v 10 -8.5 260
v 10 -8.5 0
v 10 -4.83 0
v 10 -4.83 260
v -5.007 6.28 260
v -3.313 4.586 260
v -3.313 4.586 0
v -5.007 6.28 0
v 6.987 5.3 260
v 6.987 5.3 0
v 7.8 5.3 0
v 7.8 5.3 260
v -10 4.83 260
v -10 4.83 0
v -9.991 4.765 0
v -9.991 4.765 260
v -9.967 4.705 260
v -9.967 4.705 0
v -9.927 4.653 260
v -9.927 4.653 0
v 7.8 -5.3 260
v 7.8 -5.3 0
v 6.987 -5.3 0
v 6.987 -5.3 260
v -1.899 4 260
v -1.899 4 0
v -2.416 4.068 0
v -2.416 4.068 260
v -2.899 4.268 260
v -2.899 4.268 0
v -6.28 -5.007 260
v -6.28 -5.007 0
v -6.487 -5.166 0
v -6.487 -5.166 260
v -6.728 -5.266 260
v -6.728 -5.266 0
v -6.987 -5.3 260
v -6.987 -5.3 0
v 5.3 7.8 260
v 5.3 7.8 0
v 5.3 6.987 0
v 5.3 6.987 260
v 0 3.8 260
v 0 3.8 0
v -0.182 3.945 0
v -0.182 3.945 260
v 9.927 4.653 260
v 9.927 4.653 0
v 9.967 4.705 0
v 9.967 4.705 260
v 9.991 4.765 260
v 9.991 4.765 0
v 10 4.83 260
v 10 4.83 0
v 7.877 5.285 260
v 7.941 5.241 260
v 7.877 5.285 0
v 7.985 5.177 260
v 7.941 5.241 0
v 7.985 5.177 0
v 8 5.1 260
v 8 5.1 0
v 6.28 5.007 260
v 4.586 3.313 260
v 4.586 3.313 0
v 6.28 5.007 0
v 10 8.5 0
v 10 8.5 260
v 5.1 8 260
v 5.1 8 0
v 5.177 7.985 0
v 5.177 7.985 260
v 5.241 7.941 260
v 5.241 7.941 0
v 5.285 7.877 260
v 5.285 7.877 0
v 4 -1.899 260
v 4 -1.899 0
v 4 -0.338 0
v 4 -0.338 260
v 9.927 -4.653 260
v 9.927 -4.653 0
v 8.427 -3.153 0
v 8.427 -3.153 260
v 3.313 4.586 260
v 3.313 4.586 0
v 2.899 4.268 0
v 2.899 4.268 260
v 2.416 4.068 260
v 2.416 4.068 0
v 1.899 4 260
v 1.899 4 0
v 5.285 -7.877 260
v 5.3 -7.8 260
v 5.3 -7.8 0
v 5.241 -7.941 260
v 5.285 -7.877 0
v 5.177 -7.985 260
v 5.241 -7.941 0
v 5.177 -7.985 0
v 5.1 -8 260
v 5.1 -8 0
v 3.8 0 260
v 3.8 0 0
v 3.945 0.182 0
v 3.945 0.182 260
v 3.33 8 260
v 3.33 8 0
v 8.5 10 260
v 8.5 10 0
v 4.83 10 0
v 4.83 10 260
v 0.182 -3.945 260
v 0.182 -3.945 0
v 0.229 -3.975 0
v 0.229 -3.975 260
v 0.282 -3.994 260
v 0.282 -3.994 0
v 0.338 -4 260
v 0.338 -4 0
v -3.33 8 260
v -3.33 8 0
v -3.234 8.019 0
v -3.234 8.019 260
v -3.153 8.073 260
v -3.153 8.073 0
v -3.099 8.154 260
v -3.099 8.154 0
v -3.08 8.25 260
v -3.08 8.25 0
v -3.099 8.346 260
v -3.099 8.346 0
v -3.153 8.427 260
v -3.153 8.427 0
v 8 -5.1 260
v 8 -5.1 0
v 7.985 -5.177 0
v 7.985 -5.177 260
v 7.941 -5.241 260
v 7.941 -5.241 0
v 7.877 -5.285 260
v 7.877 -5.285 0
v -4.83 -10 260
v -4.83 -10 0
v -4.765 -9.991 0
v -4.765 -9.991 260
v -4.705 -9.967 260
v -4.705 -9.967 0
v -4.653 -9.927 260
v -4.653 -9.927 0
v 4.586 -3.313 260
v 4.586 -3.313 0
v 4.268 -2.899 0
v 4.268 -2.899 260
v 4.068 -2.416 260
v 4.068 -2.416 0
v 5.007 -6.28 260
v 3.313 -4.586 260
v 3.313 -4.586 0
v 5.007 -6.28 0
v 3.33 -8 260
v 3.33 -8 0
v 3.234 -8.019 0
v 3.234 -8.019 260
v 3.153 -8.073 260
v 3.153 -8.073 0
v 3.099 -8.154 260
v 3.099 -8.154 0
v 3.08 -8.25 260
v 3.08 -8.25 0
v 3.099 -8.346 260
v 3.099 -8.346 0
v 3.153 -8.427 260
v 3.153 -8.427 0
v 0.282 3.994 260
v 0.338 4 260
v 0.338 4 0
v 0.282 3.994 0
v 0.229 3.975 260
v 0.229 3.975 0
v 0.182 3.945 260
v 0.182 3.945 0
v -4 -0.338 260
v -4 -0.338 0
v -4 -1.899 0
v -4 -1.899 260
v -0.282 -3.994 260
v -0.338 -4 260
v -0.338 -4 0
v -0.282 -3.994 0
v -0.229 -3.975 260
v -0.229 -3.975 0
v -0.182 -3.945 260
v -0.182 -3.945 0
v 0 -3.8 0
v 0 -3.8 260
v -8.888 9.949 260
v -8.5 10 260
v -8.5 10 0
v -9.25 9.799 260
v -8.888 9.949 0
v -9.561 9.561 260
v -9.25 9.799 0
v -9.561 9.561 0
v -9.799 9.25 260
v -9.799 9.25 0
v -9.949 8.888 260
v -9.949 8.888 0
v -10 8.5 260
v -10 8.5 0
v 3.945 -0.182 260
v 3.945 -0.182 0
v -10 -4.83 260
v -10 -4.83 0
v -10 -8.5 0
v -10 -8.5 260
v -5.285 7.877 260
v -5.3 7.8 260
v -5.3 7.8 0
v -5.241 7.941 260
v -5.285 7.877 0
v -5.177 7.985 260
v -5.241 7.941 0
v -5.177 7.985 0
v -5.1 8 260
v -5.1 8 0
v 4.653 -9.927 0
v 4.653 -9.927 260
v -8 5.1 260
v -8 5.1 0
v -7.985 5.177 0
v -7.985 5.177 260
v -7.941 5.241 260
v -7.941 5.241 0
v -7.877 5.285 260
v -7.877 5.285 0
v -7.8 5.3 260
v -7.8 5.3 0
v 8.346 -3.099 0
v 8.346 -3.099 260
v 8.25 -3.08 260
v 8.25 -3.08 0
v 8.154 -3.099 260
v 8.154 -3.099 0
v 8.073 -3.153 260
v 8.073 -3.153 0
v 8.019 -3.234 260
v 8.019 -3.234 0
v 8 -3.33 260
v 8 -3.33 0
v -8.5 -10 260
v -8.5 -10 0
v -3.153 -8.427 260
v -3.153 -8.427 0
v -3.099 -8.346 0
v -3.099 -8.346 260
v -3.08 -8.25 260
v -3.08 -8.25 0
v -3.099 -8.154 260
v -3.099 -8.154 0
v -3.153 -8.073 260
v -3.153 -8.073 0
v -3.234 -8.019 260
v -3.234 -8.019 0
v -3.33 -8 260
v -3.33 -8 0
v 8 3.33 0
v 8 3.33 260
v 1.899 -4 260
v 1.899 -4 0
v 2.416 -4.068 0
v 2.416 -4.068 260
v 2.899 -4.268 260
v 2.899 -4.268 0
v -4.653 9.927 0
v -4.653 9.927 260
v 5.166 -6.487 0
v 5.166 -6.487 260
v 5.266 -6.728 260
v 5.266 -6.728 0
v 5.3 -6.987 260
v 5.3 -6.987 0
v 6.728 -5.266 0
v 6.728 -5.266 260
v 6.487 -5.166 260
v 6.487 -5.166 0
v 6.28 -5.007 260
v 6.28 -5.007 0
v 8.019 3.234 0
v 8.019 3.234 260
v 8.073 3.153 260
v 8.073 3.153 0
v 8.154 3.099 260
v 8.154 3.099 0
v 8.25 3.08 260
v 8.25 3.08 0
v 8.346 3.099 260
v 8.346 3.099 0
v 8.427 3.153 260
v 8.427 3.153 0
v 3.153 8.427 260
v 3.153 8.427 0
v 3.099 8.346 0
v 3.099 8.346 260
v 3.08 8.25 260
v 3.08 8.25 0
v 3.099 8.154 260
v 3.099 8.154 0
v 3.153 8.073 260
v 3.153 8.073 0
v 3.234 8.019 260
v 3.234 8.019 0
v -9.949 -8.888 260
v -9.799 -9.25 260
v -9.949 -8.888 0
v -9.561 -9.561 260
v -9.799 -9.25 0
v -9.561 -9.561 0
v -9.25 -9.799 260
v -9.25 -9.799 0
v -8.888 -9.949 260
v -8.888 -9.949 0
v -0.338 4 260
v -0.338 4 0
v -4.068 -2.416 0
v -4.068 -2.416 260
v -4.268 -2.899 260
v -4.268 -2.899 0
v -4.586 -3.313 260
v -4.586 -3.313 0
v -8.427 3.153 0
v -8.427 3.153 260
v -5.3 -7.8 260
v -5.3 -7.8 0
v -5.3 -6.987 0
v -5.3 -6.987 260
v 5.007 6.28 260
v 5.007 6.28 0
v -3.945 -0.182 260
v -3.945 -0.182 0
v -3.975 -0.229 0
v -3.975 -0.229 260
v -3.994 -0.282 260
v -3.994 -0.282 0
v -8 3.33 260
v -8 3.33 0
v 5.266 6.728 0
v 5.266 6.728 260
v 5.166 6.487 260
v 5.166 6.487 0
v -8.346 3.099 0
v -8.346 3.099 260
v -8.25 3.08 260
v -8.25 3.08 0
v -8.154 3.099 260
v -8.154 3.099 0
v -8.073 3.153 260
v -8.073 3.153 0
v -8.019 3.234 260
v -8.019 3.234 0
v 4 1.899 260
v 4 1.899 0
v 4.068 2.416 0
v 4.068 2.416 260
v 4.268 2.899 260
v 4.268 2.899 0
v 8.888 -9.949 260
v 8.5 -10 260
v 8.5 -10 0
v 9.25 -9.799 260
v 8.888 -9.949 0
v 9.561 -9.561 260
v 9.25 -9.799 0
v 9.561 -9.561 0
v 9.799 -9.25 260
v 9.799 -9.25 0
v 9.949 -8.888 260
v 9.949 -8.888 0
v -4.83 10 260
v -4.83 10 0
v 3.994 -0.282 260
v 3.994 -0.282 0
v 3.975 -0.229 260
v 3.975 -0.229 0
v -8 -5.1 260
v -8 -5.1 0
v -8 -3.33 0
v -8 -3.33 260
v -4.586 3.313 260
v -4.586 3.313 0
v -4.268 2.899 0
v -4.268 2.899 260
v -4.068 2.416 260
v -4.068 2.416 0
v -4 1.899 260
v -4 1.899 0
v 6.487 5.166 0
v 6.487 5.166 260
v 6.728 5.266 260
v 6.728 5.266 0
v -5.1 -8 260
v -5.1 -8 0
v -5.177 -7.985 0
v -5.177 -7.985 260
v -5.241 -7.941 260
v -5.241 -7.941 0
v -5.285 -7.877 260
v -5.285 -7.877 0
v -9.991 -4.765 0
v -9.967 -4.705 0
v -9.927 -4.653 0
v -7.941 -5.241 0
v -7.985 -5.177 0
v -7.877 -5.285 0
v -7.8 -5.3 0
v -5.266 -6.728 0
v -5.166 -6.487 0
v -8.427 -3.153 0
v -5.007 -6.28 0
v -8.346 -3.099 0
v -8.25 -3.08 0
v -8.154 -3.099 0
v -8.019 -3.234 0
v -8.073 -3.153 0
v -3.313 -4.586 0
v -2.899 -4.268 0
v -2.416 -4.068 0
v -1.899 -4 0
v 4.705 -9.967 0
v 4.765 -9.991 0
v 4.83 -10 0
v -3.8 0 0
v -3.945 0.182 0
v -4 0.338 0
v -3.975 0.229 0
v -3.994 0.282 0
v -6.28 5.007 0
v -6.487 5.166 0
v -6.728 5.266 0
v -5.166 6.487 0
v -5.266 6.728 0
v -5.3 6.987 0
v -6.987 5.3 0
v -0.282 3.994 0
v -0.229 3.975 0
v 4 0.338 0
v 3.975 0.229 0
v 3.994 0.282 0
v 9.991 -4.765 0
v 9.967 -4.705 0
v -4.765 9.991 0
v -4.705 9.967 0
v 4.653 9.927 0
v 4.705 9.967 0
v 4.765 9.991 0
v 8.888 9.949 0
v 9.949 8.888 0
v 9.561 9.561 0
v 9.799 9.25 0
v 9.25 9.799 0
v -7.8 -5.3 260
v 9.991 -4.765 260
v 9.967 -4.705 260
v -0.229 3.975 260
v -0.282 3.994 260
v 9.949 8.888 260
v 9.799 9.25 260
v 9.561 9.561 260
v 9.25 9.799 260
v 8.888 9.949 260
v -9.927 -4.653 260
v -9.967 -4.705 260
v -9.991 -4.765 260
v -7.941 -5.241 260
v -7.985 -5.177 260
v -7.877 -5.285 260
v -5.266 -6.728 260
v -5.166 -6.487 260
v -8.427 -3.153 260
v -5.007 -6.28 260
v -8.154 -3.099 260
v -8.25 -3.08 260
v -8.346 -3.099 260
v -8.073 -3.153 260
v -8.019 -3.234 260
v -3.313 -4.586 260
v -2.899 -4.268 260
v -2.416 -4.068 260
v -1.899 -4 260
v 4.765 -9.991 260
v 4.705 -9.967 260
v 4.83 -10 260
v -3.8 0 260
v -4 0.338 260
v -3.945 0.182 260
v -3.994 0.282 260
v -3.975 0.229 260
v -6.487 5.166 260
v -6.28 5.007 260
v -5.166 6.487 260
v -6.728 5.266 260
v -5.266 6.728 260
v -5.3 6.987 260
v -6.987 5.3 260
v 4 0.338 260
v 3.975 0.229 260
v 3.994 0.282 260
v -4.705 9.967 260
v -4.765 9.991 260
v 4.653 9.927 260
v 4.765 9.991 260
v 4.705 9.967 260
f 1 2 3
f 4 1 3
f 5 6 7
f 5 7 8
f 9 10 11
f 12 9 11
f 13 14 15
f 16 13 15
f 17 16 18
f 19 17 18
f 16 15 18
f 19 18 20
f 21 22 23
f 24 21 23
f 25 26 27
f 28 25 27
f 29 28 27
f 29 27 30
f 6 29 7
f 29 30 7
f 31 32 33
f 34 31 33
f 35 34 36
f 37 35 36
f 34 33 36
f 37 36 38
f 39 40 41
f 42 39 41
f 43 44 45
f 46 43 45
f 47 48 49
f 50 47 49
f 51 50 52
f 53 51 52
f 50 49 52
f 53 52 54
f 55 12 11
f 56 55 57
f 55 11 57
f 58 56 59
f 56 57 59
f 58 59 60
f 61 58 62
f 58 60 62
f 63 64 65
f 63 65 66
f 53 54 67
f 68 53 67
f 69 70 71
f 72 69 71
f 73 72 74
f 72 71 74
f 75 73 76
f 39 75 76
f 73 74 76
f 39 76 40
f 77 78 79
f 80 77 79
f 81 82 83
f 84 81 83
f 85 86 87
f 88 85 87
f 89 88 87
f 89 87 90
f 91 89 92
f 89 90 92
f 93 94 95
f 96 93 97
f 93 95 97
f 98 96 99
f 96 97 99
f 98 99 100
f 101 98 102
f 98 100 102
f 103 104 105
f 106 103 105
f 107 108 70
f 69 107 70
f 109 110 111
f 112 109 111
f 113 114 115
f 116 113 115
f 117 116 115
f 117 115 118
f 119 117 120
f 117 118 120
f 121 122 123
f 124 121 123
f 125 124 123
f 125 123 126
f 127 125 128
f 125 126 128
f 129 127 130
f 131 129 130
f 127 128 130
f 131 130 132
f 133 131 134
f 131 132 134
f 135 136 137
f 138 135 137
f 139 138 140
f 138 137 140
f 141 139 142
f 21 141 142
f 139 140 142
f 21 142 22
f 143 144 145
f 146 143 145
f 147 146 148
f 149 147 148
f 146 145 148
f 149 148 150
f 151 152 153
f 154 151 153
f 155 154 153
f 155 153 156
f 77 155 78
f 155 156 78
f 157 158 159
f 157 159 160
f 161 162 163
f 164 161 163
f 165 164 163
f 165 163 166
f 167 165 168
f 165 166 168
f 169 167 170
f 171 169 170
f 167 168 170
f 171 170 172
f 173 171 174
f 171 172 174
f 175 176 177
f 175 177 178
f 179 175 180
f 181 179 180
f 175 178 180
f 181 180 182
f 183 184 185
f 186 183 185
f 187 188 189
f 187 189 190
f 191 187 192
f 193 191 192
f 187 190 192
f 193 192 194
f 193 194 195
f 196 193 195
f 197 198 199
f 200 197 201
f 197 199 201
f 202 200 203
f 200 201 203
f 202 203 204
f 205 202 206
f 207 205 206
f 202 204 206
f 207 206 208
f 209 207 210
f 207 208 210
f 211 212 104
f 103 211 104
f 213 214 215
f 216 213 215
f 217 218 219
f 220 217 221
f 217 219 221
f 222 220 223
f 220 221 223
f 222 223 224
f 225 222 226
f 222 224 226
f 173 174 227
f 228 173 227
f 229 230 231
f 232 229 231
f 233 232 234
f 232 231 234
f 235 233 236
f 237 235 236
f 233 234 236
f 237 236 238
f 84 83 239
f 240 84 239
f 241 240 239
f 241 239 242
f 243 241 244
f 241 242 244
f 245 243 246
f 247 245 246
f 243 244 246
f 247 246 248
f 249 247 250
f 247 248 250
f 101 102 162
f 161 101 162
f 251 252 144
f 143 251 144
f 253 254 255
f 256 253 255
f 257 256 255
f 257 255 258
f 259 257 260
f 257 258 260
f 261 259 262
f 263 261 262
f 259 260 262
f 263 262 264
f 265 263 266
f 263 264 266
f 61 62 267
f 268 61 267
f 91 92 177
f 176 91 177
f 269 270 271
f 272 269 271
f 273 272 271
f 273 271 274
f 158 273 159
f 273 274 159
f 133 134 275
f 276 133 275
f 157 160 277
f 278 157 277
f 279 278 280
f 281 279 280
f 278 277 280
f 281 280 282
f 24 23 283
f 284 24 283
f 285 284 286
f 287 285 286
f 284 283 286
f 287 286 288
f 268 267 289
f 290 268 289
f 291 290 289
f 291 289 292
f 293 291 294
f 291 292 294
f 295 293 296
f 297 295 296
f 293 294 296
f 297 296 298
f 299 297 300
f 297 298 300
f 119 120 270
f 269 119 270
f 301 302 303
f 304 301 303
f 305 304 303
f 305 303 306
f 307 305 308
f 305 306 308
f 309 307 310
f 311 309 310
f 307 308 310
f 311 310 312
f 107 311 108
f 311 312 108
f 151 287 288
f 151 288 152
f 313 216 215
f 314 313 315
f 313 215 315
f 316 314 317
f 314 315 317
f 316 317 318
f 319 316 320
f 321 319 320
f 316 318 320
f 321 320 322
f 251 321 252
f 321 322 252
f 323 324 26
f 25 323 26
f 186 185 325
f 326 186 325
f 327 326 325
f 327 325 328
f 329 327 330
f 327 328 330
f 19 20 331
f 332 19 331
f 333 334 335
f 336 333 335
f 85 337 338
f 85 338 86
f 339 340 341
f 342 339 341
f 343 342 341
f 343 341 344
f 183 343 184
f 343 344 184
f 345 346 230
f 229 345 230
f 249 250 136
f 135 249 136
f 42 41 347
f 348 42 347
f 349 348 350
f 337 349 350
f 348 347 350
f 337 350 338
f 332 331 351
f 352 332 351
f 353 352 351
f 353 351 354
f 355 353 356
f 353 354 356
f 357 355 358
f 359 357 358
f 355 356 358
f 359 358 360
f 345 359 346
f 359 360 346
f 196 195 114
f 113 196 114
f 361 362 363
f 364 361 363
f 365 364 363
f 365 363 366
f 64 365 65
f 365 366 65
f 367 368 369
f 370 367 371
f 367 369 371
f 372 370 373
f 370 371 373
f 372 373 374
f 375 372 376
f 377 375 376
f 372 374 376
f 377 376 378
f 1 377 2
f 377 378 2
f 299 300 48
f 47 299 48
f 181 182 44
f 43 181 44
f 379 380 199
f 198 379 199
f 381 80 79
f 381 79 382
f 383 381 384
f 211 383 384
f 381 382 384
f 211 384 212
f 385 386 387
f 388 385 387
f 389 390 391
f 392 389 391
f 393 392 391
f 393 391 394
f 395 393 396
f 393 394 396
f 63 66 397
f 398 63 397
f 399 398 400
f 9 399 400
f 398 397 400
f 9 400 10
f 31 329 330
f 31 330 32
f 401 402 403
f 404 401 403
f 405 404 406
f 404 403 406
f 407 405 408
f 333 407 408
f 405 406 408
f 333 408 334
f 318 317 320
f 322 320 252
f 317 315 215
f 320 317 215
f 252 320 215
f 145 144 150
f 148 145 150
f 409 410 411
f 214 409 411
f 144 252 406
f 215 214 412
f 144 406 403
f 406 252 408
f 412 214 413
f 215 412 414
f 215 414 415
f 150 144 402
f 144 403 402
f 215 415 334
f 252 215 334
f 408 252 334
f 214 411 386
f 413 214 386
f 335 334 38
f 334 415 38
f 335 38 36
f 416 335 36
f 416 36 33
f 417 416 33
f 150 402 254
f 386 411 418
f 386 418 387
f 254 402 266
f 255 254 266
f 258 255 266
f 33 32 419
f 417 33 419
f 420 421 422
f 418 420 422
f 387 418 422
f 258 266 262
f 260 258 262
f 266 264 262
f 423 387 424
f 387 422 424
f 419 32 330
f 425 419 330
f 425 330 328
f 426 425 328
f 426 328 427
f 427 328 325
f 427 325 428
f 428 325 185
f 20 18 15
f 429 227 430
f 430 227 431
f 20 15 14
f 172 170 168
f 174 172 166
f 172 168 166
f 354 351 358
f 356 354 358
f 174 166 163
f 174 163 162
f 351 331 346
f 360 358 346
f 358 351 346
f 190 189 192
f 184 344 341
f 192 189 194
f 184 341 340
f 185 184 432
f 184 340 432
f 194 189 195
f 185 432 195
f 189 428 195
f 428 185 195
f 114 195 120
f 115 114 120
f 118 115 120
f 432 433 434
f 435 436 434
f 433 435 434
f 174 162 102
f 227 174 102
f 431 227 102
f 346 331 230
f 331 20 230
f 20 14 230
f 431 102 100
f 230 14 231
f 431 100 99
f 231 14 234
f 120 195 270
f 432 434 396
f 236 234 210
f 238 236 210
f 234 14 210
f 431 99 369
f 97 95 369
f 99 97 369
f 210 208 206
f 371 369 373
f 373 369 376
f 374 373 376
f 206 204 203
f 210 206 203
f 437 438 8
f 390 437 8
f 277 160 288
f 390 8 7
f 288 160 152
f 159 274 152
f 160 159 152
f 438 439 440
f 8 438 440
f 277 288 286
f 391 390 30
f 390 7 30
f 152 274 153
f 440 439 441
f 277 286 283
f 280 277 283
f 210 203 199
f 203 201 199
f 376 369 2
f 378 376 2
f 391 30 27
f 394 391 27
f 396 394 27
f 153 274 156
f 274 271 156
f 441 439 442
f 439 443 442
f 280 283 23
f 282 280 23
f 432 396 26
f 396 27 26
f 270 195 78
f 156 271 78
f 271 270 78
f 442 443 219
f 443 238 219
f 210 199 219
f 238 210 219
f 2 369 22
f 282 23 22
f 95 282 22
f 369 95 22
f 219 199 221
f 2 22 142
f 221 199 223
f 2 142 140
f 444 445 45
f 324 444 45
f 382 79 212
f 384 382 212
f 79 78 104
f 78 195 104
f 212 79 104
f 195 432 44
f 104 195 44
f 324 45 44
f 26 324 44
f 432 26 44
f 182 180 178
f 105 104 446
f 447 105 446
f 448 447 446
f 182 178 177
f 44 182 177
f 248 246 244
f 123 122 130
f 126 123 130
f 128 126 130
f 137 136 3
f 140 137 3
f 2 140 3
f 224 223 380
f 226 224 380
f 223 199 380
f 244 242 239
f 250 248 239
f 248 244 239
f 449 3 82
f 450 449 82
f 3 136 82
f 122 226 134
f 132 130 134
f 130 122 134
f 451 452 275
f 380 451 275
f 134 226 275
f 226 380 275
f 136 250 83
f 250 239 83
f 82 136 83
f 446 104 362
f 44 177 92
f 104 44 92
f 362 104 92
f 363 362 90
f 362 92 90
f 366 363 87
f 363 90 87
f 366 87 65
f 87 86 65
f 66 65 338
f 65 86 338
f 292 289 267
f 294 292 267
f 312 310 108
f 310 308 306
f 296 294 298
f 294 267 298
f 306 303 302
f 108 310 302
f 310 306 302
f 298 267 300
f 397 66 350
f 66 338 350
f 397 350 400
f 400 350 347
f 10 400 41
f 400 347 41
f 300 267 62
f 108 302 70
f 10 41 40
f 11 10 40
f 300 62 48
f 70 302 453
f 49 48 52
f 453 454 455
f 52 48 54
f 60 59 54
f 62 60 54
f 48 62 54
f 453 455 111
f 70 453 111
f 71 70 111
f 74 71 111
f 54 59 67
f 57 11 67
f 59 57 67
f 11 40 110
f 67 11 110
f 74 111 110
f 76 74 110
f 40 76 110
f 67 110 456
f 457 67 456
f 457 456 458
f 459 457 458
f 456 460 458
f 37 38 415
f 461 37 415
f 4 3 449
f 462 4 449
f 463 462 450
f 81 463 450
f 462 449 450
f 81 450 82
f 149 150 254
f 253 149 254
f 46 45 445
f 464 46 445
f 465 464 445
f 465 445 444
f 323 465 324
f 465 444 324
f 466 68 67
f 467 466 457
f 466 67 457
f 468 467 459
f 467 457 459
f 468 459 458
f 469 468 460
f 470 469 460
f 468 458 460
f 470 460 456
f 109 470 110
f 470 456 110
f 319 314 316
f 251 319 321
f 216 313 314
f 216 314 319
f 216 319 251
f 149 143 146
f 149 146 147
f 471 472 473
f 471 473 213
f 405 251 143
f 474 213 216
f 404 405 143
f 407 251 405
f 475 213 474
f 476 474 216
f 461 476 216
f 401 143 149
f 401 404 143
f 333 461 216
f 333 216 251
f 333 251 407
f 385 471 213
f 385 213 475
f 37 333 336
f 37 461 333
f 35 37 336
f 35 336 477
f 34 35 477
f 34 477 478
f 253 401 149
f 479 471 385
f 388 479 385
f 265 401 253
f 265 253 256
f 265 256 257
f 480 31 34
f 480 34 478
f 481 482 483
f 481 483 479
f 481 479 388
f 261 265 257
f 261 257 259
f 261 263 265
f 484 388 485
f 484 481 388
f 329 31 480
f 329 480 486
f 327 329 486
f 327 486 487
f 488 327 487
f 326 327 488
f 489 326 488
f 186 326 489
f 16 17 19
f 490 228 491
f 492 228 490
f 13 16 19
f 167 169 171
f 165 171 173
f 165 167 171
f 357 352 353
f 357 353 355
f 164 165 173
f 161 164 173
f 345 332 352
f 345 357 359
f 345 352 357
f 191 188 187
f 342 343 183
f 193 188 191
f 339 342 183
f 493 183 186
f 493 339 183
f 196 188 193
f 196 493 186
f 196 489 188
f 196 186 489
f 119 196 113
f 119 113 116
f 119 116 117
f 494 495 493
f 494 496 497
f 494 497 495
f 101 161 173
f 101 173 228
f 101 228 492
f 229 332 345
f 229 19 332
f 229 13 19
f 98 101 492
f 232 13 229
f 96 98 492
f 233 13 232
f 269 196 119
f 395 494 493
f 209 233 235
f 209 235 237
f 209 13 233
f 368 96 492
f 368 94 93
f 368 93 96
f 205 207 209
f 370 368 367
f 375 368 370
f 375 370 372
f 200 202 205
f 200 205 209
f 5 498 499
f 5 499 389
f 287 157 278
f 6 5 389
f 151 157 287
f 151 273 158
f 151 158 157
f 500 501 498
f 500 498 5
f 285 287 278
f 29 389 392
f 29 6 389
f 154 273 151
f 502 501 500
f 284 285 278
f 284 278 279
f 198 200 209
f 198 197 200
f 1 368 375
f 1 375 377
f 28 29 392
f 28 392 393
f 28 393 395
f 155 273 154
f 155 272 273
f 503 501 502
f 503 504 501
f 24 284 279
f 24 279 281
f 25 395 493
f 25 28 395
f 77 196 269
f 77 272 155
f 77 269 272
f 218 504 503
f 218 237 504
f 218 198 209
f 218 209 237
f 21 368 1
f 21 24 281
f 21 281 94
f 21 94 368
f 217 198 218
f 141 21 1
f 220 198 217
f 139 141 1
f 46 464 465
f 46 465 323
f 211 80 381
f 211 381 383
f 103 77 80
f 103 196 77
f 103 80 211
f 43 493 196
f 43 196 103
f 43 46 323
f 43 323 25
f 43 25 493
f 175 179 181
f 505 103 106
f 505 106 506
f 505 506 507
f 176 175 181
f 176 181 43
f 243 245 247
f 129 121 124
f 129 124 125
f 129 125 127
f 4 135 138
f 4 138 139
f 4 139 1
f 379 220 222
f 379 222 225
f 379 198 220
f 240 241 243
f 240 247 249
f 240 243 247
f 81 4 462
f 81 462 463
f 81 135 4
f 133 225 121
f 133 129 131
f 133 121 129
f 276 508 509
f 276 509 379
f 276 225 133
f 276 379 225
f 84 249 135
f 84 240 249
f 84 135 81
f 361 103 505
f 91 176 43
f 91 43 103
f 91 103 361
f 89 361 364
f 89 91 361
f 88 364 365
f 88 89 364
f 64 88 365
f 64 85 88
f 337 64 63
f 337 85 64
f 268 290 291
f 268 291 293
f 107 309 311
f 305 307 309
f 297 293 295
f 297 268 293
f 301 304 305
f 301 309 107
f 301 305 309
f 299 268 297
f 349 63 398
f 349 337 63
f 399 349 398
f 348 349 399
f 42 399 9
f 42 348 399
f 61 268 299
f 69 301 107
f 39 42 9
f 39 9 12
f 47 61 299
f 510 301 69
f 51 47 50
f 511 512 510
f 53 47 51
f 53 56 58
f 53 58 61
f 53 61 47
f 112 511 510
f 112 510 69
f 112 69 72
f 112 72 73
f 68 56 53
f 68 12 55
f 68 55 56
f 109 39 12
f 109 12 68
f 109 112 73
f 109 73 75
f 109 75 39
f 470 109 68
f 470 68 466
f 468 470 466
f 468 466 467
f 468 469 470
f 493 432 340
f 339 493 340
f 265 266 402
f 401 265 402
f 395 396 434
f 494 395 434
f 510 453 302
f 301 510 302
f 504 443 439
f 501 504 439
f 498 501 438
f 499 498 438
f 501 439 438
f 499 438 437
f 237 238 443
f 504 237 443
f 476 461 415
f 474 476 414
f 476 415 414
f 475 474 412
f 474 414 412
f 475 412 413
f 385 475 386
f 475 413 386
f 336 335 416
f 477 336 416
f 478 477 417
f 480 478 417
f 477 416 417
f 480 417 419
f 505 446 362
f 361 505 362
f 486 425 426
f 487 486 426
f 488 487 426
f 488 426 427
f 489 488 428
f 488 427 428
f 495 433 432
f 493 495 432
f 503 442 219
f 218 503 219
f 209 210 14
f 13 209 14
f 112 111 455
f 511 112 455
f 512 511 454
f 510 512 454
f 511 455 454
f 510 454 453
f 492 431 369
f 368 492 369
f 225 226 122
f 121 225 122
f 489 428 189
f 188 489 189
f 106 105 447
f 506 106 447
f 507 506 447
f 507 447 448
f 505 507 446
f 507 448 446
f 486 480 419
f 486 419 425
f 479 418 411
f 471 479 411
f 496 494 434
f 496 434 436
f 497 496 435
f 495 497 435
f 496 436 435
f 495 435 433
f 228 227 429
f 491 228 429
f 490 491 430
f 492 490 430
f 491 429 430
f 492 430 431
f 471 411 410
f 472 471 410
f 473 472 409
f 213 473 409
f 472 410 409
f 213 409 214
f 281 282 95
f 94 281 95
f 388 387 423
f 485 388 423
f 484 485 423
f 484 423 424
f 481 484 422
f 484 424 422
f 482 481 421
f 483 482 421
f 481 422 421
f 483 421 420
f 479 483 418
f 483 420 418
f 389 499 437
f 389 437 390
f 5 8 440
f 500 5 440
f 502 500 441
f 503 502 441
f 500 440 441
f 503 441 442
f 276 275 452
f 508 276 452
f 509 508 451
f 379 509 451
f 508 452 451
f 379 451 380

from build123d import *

# Parameters (mm, degrees)
EXTRUDE_1_DEPTH = 260


# Read off the part's stored shape, not the designer's step: 222 Конструкционный профиль 20х20-1-surface1
with BuildPart() as part:
    # Эскиз1 → Бобышка-Вытянуть1 (new body)
    with BuildSketch(Plane.XY):
        with BuildLine():
            Line((-3.945217202, 0.181521503), (-3.8, 0))
            Line((-3.8, 0), (-3.945217202, -0.181521503))
            ThreePointArc((-3.945217202, -0.181521503), (-3.98590708, -0.254943529), (-4, -0.337695265))
            Line((-4, -0.337695265), (-4, -1.898780669))
            ThreePointArc((-4, -1.898780669), (-4.152240935, -2.664147534), (-4.585786438, -3.312994231))
            Line((-4.585786438, -3.312994231), (-6.279898987, -5.007106781))
            ThreePointArc((-6.279898987, -5.007106781), (-6.604322336, -5.223879533), (-6.987005769, -5.3))
            Line((-6.987005769, -5.3), (-7.8, -5.3))
            ThreePointArc((-7.8, -5.3), (-7.941421356, -5.241421356), (-8, -5.1))
            Line((-8, -5.1), (-8, -3.33))
            ThreePointArc((-8, -3.33), (-8.154329142, -3.099030117), (-8.426776695, -3.153223305))
            Line((-8.426776695, -3.153223305), (-9.926776695, -4.653223305))
            ThreePointArc((-9.926776695, -4.653223305), (-9.980969883, -4.734329142), (-10, -4.83))
            Line((-10, -4.83), (-10, -8.5))
            ThreePointArc((-10, -8.5), (-9.560660172, -9.560660172), (-8.5, -10))
            Line((-8.5, -10), (-4.83, -10))
            ThreePointArc((-4.83, -10), (-4.734329142, -9.980969883), (-4.653223305, -9.926776695))
            Line((-4.653223305, -9.926776695), (-3.153223305, -8.426776695))
            ThreePointArc((-3.153223305, -8.426776695), (-3.099030117, -8.154329142), (-3.33, -8))
            Line((-3.33, -8), (-5.1, -8))
            ThreePointArc((-5.1, -8), (-5.241421356, -7.941421356), (-5.3, -7.8))
            Line((-5.3, -7.8), (-5.3, -6.987005769))
            ThreePointArc((-5.3, -6.987005769), (-5.223879533, -6.604322336), (-5.007106781, -6.279898987))
            Line((-5.007106781, -6.279898987), (-3.312994231, -4.585786438))
            ThreePointArc((-3.312994231, -4.585786438), (-2.664147534, -4.152240935), (-1.898780669, -4))
            Line((-1.898780669, -4), (-0.337695265, -4))
            ThreePointArc((-0.337695265, -4), (-0.254943529, -3.98590708), (-0.181521503, -3.945217202))
            Line((-0.181521503, -3.945217202), (0, -3.8))
            Line((0, -3.8), (0.181521503, -3.945217202))
            ThreePointArc((0.181521503, -3.945217202), (0.254943529, -3.98590708), (0.337695265, -4))
            Line((0.337695265, -4), (1.898780669, -4))
            ThreePointArc((1.898780669, -4), (2.664147534, -4.152240935), (3.312994231, -4.585786438))
            Line((3.312994231, -4.585786438), (5.007106781, -6.279898987))
            ThreePointArc((5.007106781, -6.279898987), (5.223879533, -6.604322336), (5.3, -6.987005769))
            Line((5.3, -6.987005769), (5.3, -7.8))
            ThreePointArc((5.3, -7.8), (5.241421356, -7.941421356), (5.1, -8))
            Line((5.1, -8), (3.33, -8))
            ThreePointArc((3.33, -8), (3.099030117, -8.154329142), (3.153223305, -8.426776695))
            Line((3.153223305, -8.426776695), (4.653223305, -9.926776695))
            ThreePointArc((4.653223305, -9.926776695), (4.734329142, -9.980969883), (4.83, -10))
            Line((4.83, -10), (8.5, -10))
            ThreePointArc((8.5, -10), (9.560660172, -9.560660172), (10, -8.5))
            Line((10, -8.5), (10, -4.83))
            ThreePointArc((10, -4.83), (9.980969883, -4.734329142), (9.926776695, -4.653223305))
            Line((9.926776695, -4.653223305), (8.426776695, -3.153223305))
            ThreePointArc((8.426776695, -3.153223305), (8.154329142, -3.099030117), (8, -3.33))
            Line((8, -3.33), (8, -5.1))
            ThreePointArc((8, -5.1), (7.941421356, -5.241421356), (7.8, -5.3))
            Line((7.8, -5.3), (6.987005769, -5.3))
            ThreePointArc((6.987005769, -5.3), (6.604322336, -5.223879533), (6.279898987, -5.007106781))
            Line((6.279898987, -5.007106781), (4.585786438, -3.312994231))
            ThreePointArc((4.585786438, -3.312994231), (4.152240935, -2.664147534), (4, -1.898780669))
            Line((4, -1.898780669), (4, -0.337695265))
            ThreePointArc((4, -0.337695265), (3.98590708, -0.254943529), (3.945217202, -0.181521503))
            Line((3.945217202, -0.181521503), (3.8, 0))
            Line((3.8, 0), (3.945217202, 0.181521503))
            ThreePointArc((3.945217202, 0.181521503), (3.98590708, 0.254943529), (4, 0.337695265))
            Line((4, 0.337695265), (4, 1.898780669))
            ThreePointArc((4, 1.898780669), (4.152240935, 2.664147534), (4.585786438, 3.312994231))
            Line((4.585786438, 3.312994231), (6.279898987, 5.007106781))
            ThreePointArc((6.279898987, 5.007106781), (6.604322336, 5.223879533), (6.987005769, 5.3))
            Line((6.987005769, 5.3), (7.8, 5.3))
            ThreePointArc((7.8, 5.3), (7.941421356, 5.241421356), (8, 5.1))
            Line((8, 5.1), (8, 3.33))
            ThreePointArc((8, 3.33), (8.154329142, 3.099030117), (8.426776695, 3.153223305))
            Line((8.426776695, 3.153223305), (9.926776695, 4.653223305))
            ThreePointArc((9.926776695, 4.653223305), (9.980969883, 4.734329142), (10, 4.83))
            Line((10, 4.83), (10, 8.5))
            ThreePointArc((10, 8.5), (9.560660172, 9.560660172), (8.5, 10))
            Line((8.5, 10), (4.83, 10))
            ThreePointArc((4.83, 10), (4.734329142, 9.980969883), (4.653223305, 9.926776695))
            Line((4.653223305, 9.926776695), (3.153223305, 8.426776695))
            ThreePointArc((3.153223305, 8.426776695), (3.099030117, 8.154329142), (3.33, 8))
            Line((3.33, 8), (5.1, 8))
            ThreePointArc((5.1, 8), (5.241421356, 7.941421356), (5.3, 7.8))
            Line((5.3, 7.8), (5.3, 6.987005769))
            ThreePointArc((5.3, 6.987005769), (5.223879533, 6.604322336), (5.007106781, 6.279898987))
            Line((5.007106781, 6.279898987), (3.312994231, 4.585786438))
            ThreePointArc((3.312994231, 4.585786438), (2.664147534, 4.152240935), (1.898780669, 4))
            Line((1.898780669, 4), (0.337695265, 4))
            ThreePointArc((0.337695265, 4), (0.254943529, 3.98590708), (0.181521503, 3.945217202))
            Line((0.181521503, 3.945217202), (0, 3.8))
            Line((0, 3.8), (-0.181521503, 3.945217202))
            ThreePointArc((-0.181521503, 3.945217202), (-0.254943529, 3.98590708), (-0.337695265, 4))
            Line((-0.337695265, 4), (-1.898780669, 4))
            ThreePointArc((-1.898780669, 4), (-2.664147534, 4.152240935), (-3.312994231, 4.585786438))
            Line((-3.312994231, 4.585786438), (-5.007106781, 6.279898987))
            ThreePointArc((-5.007106781, 6.279898987), (-5.223879533, 6.604322336), (-5.3, 6.987005769))
            Line((-5.3, 6.987005769), (-5.3, 7.8))
            ThreePointArc((-5.3, 7.8), (-5.241421356, 7.941421356), (-5.1, 8))
            Line((-5.1, 8), (-3.33, 8))
            ThreePointArc((-3.33, 8), (-3.099030117, 8.154329142), (-3.153223305, 8.426776695))
            Line((-3.153223305, 8.426776695), (-4.653223305, 9.926776695))
            ThreePointArc((-4.653223305, 9.926776695), (-4.734329142, 9.980969883), (-4.83, 10))
            Line((-4.83, 10), (-8.5, 10))
            ThreePointArc((-8.5, 10), (-9.560660172, 9.560660172), (-10, 8.5))
            Line((-10, 8.5), (-10, 4.83))
            ThreePointArc((-10, 4.83), (-9.980969883, 4.734329142), (-9.926776695, 4.653223305))
            Line((-9.926776695, 4.653223305), (-8.426776695, 3.153223305))
            ThreePointArc((-8.426776695, 3.153223305), (-8.154329142, 3.099030117), (-8, 3.33))
            Line((-8, 3.33), (-8, 5.1))
            ThreePointArc((-8, 5.1), (-7.941421356, 5.241421356), (-7.8, 5.3))
            Line((-7.8, 5.3), (-6.987005769, 5.3))
            ThreePointArc((-6.987005769, 5.3), (-6.604322336, 5.223879533), (-6.279898987, 5.007106781))
            Line((-6.279898987, 5.007106781), (-4.585786438, 3.312994231))
            ThreePointArc((-4.585786438, 3.312994231), (-4.152240935, 2.664147534), (-4, 1.898780669))
            Line((-4, 1.898780669), (-4, 0.337695265))
            ThreePointArc((-4, 0.337695265), (-3.98590708, 0.254943529), (-3.945217202, 0.181521503))
        make_face()
    extrude(amount=EXTRUDE_1_DEPTH)


solid = part.part
